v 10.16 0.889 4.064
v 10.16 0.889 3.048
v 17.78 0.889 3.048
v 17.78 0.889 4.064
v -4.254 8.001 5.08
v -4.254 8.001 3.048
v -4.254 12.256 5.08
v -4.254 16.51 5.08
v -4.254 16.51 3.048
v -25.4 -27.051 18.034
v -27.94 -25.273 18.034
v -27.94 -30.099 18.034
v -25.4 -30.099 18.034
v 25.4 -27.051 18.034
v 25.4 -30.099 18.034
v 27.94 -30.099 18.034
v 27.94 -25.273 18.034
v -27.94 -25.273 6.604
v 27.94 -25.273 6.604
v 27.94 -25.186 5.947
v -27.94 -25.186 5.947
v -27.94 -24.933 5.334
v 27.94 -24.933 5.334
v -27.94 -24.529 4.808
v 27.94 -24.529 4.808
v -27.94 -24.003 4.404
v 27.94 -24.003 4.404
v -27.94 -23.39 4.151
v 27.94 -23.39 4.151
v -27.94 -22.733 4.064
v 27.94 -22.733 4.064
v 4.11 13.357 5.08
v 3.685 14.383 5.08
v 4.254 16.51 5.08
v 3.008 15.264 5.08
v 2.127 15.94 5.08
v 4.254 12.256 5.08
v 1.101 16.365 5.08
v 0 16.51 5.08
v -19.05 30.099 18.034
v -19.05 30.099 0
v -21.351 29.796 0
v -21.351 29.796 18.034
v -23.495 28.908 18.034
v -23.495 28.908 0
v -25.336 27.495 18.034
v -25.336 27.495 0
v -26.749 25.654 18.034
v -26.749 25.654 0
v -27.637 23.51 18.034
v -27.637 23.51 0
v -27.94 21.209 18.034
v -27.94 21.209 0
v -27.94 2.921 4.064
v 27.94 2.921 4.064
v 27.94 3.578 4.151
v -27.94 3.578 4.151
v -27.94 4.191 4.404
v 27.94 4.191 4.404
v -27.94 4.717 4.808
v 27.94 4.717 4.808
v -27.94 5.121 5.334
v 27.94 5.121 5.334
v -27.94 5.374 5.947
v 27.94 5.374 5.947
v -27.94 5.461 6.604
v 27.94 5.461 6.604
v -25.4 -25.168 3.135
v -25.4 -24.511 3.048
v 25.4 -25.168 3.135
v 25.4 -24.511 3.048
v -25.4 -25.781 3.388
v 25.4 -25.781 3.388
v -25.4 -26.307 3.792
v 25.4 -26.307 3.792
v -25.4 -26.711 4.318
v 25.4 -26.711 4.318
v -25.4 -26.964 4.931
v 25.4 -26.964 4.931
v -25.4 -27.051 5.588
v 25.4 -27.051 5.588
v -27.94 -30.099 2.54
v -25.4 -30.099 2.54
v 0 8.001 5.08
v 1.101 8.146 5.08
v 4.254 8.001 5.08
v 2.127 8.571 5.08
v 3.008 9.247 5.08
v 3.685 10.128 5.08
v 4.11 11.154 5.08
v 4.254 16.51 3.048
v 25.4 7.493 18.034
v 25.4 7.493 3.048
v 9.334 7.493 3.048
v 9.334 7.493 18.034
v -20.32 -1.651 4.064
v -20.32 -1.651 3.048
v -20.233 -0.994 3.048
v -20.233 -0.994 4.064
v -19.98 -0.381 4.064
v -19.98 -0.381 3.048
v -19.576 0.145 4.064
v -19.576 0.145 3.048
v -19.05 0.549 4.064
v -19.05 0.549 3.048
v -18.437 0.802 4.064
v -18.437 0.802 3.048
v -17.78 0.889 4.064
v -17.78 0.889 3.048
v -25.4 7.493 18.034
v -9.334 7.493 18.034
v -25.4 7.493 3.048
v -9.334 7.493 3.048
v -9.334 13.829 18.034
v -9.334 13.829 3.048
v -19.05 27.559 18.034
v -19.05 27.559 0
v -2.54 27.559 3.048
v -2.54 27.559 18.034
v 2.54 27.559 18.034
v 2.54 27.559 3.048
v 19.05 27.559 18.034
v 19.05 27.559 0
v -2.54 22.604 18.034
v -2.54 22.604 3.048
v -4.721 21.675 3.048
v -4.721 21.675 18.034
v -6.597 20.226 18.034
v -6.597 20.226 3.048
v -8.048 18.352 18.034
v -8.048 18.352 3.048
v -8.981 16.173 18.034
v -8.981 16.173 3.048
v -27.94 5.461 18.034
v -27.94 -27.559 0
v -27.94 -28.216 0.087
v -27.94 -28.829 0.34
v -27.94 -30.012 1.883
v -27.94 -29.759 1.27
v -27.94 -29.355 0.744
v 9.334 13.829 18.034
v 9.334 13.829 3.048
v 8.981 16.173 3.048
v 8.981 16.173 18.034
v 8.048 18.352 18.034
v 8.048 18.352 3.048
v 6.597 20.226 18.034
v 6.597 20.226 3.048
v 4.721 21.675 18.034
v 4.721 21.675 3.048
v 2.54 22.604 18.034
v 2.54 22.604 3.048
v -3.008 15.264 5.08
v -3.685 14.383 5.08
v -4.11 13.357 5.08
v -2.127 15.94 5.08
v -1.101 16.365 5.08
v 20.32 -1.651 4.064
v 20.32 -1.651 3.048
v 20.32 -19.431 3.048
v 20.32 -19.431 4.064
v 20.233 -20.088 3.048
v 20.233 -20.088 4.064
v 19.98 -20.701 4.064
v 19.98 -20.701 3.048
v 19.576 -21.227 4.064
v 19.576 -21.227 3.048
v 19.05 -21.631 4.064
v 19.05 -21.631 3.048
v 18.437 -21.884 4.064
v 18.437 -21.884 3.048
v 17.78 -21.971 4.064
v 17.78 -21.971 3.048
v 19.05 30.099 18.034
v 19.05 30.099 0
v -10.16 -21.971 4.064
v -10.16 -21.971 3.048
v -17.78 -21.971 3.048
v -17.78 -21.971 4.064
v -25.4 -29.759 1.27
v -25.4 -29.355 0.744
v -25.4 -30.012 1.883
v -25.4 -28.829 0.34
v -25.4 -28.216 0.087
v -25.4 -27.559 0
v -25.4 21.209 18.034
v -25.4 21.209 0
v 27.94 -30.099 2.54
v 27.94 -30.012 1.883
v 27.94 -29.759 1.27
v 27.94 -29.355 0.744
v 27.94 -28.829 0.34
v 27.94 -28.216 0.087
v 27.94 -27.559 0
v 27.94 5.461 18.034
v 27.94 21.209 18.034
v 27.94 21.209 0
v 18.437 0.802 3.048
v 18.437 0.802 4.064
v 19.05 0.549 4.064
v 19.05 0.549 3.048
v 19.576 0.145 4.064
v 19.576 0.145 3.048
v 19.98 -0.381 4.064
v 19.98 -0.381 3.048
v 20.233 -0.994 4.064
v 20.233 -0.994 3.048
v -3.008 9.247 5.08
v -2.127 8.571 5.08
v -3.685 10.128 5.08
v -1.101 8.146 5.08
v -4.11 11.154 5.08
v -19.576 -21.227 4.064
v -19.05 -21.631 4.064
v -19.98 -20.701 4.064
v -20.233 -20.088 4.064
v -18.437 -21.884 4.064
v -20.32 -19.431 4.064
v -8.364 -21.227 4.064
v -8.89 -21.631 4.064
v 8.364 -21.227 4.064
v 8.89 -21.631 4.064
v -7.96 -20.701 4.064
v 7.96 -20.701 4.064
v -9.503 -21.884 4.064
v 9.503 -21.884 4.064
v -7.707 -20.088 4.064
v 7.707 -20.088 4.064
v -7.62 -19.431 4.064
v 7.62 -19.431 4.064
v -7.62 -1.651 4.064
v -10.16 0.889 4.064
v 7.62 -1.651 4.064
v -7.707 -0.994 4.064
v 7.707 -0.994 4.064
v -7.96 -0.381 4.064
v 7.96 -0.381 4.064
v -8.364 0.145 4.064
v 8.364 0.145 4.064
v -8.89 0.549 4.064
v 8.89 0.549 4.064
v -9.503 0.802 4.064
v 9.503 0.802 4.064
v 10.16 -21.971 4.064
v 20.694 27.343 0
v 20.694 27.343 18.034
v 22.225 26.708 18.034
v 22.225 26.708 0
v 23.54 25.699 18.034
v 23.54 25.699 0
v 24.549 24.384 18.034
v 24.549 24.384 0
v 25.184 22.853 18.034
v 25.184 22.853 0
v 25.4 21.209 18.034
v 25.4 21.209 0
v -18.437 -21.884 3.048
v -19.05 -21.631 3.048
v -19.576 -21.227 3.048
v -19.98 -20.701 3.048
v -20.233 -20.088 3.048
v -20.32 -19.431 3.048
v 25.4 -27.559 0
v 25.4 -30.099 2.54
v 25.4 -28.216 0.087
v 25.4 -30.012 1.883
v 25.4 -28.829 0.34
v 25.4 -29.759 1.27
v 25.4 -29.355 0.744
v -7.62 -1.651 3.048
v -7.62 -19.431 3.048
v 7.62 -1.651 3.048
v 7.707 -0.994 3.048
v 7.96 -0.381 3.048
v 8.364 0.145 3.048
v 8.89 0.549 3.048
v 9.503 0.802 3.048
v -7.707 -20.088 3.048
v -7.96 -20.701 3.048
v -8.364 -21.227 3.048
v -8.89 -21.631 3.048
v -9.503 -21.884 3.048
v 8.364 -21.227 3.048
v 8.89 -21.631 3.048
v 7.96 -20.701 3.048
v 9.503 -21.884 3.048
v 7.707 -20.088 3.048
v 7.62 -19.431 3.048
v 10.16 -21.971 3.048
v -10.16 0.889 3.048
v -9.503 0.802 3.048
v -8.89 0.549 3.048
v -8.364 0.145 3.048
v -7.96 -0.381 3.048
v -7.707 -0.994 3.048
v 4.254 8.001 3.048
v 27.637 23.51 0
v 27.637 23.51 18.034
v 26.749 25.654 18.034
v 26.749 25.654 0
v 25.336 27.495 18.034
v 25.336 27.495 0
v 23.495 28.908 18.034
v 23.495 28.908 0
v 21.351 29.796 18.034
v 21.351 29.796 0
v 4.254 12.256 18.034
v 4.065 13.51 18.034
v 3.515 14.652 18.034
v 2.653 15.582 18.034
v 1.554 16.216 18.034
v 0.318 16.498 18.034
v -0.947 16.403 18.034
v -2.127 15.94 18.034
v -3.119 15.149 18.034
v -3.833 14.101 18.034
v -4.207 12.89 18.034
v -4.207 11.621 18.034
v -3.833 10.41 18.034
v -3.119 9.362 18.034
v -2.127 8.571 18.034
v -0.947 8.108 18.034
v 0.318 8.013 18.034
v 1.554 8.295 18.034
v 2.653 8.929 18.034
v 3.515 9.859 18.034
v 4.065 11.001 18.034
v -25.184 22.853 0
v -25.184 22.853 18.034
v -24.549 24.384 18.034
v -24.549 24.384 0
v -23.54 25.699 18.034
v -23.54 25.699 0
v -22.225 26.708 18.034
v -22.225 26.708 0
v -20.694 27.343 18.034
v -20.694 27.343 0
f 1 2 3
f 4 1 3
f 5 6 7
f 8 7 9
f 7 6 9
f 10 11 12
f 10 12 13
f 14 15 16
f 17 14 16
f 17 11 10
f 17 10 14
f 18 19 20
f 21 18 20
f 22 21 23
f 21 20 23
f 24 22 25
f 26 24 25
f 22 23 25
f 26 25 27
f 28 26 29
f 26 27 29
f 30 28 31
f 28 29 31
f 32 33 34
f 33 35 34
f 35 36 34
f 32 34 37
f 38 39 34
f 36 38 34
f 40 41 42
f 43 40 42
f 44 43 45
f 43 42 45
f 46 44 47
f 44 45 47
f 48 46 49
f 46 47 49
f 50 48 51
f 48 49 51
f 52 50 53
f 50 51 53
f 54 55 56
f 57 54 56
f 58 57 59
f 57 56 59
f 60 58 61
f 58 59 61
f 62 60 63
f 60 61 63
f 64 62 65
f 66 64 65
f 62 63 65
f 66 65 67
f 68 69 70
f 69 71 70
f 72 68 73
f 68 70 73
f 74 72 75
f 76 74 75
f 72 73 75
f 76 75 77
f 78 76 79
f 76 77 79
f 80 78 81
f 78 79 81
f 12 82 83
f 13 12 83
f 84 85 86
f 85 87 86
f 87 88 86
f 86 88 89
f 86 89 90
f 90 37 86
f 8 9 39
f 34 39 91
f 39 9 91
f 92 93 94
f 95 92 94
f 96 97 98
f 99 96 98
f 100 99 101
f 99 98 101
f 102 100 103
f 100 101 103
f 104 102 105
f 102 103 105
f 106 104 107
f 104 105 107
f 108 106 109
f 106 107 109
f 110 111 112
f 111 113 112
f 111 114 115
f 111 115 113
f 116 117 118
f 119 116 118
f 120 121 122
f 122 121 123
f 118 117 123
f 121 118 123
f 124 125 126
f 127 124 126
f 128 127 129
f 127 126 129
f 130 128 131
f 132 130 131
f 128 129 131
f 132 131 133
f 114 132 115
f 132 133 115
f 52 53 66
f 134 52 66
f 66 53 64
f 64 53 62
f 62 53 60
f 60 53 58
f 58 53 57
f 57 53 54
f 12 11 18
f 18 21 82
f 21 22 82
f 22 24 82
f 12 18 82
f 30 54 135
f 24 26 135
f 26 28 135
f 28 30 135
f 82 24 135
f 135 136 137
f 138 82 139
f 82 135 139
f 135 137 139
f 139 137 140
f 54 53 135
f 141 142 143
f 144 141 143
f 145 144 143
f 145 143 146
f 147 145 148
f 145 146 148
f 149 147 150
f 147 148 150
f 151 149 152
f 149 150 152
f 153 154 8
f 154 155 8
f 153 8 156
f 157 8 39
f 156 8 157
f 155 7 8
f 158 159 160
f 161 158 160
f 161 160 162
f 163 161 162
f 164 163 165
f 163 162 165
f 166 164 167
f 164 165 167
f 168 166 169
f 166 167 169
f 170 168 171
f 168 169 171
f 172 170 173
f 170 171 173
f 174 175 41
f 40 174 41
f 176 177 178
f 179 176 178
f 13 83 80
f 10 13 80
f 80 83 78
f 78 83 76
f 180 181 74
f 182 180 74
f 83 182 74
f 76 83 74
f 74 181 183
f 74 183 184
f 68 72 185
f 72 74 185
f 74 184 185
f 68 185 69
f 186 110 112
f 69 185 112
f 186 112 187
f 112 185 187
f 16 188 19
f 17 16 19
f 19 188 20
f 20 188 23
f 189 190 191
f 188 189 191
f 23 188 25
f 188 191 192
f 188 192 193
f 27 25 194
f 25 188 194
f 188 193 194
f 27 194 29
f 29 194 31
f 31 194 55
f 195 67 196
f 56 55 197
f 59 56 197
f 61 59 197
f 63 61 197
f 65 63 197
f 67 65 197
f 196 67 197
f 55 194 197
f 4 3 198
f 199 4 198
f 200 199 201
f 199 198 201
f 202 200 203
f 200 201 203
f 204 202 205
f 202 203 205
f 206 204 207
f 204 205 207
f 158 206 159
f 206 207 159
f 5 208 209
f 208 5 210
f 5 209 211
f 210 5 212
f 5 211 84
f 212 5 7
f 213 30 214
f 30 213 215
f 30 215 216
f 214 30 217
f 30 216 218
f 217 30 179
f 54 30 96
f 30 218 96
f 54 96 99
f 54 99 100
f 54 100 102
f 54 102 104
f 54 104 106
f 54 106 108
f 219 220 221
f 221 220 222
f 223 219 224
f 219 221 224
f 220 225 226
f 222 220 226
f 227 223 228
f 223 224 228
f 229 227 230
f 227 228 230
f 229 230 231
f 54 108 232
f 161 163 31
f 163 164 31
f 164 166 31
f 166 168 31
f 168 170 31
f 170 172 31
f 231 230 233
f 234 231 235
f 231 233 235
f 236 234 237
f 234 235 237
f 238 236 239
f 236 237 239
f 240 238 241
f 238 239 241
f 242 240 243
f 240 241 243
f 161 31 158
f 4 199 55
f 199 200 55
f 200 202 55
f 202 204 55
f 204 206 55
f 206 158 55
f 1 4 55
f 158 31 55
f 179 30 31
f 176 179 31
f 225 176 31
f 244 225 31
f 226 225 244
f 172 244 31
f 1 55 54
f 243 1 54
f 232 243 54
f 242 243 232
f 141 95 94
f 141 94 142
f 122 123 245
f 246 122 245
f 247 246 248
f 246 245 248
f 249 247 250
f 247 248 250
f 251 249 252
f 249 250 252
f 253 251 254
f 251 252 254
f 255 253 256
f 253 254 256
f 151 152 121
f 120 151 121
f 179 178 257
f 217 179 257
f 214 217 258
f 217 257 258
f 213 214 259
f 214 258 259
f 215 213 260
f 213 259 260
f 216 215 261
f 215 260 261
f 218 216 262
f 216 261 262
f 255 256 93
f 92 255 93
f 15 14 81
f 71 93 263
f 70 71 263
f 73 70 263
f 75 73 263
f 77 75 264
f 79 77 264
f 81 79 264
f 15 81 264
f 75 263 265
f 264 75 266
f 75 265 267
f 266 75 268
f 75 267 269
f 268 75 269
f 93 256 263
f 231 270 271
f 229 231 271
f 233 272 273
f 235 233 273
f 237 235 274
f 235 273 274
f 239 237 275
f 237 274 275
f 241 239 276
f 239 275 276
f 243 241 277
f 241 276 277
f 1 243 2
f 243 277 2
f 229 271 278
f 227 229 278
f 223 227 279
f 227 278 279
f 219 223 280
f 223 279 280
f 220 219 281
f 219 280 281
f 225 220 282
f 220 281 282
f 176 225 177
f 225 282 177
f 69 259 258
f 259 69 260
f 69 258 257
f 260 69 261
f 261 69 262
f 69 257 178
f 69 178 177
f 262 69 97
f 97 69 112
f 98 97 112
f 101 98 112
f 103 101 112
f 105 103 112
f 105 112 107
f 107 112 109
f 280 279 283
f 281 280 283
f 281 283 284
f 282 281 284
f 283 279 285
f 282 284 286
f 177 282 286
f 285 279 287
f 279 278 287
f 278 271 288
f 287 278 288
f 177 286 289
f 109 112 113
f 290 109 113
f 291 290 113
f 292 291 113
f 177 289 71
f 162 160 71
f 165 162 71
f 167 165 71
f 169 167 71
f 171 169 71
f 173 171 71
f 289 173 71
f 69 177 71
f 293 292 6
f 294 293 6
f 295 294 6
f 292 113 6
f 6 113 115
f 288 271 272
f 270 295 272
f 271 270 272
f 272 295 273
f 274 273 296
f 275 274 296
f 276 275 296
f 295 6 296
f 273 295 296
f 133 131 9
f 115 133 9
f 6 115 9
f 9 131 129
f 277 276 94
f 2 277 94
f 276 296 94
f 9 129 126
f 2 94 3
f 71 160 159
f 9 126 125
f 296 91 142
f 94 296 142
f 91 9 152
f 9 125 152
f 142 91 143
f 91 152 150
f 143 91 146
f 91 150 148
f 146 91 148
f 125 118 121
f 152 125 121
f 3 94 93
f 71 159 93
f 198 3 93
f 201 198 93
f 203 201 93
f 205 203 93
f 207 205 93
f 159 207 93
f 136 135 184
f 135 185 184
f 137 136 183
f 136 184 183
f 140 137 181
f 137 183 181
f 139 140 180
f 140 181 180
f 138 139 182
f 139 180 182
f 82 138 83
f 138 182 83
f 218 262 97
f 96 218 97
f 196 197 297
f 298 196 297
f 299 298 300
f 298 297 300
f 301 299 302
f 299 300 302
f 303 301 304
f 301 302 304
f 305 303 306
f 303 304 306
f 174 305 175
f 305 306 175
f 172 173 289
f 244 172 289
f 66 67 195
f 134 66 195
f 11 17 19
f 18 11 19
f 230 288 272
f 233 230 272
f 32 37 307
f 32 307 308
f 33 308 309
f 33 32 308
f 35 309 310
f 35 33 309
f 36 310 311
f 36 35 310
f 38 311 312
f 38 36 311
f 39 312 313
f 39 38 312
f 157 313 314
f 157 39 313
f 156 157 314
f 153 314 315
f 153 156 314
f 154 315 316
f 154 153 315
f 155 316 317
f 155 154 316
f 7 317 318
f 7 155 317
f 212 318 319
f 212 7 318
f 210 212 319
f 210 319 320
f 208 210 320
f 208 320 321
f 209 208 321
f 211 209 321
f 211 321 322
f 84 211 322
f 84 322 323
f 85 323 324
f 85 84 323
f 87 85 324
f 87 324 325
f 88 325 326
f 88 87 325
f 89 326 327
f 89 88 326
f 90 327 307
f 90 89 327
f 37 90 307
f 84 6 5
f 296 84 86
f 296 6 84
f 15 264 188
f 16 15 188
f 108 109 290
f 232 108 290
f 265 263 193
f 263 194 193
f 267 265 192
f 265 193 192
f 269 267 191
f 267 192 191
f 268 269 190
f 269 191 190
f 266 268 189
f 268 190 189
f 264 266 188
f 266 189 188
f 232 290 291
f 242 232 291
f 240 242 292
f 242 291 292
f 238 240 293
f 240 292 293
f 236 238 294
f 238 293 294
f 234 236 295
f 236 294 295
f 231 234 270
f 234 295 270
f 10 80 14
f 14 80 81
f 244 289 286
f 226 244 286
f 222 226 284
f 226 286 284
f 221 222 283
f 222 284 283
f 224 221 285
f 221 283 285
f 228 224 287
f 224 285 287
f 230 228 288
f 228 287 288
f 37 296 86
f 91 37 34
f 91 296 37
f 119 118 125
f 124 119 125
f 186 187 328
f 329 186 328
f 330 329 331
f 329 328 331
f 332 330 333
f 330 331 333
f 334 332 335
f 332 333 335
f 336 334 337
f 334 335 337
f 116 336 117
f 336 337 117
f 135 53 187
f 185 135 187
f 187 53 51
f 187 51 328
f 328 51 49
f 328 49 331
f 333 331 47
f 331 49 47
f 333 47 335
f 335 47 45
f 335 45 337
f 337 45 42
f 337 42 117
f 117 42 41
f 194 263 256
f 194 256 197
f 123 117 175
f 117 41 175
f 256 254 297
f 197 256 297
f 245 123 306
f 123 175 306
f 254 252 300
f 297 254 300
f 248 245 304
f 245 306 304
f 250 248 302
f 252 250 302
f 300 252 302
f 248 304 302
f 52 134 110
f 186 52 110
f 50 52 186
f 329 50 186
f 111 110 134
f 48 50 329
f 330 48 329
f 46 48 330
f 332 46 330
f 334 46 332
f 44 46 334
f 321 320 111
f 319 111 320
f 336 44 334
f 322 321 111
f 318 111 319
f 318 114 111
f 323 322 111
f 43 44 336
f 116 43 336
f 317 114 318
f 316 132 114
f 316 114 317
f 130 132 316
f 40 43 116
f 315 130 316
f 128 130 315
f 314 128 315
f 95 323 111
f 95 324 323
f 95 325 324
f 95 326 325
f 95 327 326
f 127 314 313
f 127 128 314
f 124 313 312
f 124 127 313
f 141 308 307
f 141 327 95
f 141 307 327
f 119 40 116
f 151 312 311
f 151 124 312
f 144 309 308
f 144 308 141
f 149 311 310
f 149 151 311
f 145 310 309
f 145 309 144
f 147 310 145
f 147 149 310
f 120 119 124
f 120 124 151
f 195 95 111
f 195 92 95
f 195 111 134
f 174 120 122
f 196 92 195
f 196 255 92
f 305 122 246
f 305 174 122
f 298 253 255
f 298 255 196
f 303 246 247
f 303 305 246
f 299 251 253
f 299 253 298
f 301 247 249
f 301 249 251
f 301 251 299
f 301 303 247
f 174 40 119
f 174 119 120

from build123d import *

# Parameters (mm, degrees)
F1_DEPTH = 18.034
F3_W     = 8.509
F3_H     = 8.509
F4_DEPTH = 2.032
F5_R     = 4.2545
F6_DEPTH = 12.954
F8_DEPTH = 55.881
F9_R     = 2.54


with BuildPart() as f1:
    # F0 (on Top) → F1 (new body)
    with BuildSketch(Plane.XY):
        with BuildLine():
            Line((-27.94, 21.209), (-27.94, -30.099))
            Line((-27.94, -30.099), (-25.4, -30.099))
            Line((-25.4, -30.099), (-25.4, 21.209))
            ThreePointArc((-25.4, 21.209), (-23.540128, 25.699128), (-19.05, 27.559))
            Line((-19.05, 27.559), (19.05, 27.559))
            ThreePointArc((19.05, 27.559), (23.540128, 25.699128), (25.4, 21.209))
            Line((25.4, 21.209), (25.4, -30.099))
            Line((25.4, -30.099), (27.94, -30.099))
            Line((27.94, -30.099), (27.94, 21.209))
            ThreePointArc((27.94, 21.209), (25.336179, 27.495179), (19.05, 30.099))
            Line((19.05, 30.099), (-19.05, 30.099))
            ThreePointArc((-19.05, 30.099), (-25.336179, 27.495179), (-27.94, 21.209))
        make_face()
    extrude(amount=F1_DEPTH)

    # F3 (on offset) → F4 (join)
    with BuildSketch(Plane.XY.offset(3.048)):
        with BuildLine():
            Line((-25.4, 7.493), (-25.4, -27.051))
            Line((-25.4, -27.051), (25.4, -27.051))
            Line((25.4, -27.051), (25.4, 7.493))
            Line((25.4, 7.493), (9.3345, 7.493))
            Line((9.3345, 7.493), (9.3345, 13.828916))
            ThreePointArc((9.3345, 13.828916), (7.382472, 19.335437), (2.54, 22.60387))
            Line((2.54, 22.60387), (2.54, 27.559))
            Line((2.54, 27.559), (-2.54, 27.559))
            Line((-2.54, 27.559), (-2.54, 22.60387))
            ThreePointArc((-2.54, 22.60387), (-7.382472, 19.335437), (-9.3345, 13.828916))
            Line((-9.3345, 13.828916), (-9.3345, 7.493))
            Line((-9.3345, 7.493), (-25.4, 7.493))
        make_face()
        with BuildLine():
            ThreePointArc((-20.32, -1.651), (-19.576051, 0.145051), (-17.78, 0.889))
            Line((-17.78, 0.889), (-10.16, 0.889))
            ThreePointArc((-10.16, 0.889), (-8.363949, 0.145051), (-7.62, -1.651))
            Line((-7.62, -1.651), (-7.62, -19.431))
            ThreePointArc((-7.62, -19.431), (-8.363949, -21.227051), (-10.16, -21.971))
            Line((-10.16, -21.971), (-17.78, -21.971))
            ThreePointArc((-17.78, -21.971), (-19.576051, -21.227051), (-20.32, -19.431))
            Line((-20.32, -19.431), (-20.32, -1.651))
        make_face(mode=Mode.SUBTRACT)
        with BuildLine():
            ThreePointArc((7.62, -1.651), (8.363949, 0.145051), (10.16, 0.889))
            Line((10.16, 0.889), (17.78, 0.889))
            ThreePointArc((17.78, 0.889), (19.576051, 0.145051), (20.32, -1.651))
            Line((20.32, -1.651), (20.32, -19.431))
            ThreePointArc((20.32, -19.431), (19.576051, -21.227051), (17.78, -21.971))
            Line((17.78, -21.971), (10.16, -21.971))
            ThreePointArc((10.16, -21.971), (8.363949, -21.227051), (7.62, -19.431))
            Line((7.62, -19.431), (7.62, -1.651))
        make_face(mode=Mode.SUBTRACT)
        with Locations((0, 12.2555)):
            Rectangle(F3_W, F3_H, mode=Mode.SUBTRACT)
    extrude(amount=F4_DEPTH)

    # F5 (on face) → F6 (join, through all)
    with BuildSketch(Plane.XY.offset(5.08)):
        with BuildLine():
            Line((-9.3345, 13.828916), (-9.3345, 7.493))
            Line((-9.3345, 7.493), (-25.4, 7.493))
            Line((-25.4, 7.493), (-25.4, -27.051))
            Line((-25.4, -27.051), (25.4, -27.051))
            Line((25.4, -27.051), (25.4, 7.493))
            Line((25.4, 7.493), (9.3345, 7.493))
            Line((9.3345, 7.493), (9.3345, 13.828916))
            ThreePointArc((9.3345, 13.828916), (7.382472, 19.335437), (2.54, 22.60387))
            Line((2.54, 22.60387), (2.54, 27.559))
            Line((2.54, 27.559), (-2.54, 27.559))
            Line((-2.54, 27.559), (-2.54, 22.60387))
            ThreePointArc((-2.54, 22.60387), (-7.382472, 19.335437), (-9.3345, 13.828916))
        make_face()
        with Locations((0, 12.2555)):
            Circle(F5_R, mode=Mode.SUBTRACT)
    extrude(amount=F6_DEPTH)

    # F7 (on face) → F8 (cut, through all)
    with BuildSketch(Plane.YZ.offset(27.94)):
        with BuildLine():
            Line((5.461, 18.034), (-25.273, 18.034))
            Line((-25.273, 18.034), (-25.273, 6.604))
            ThreePointArc((-25.273, 6.604), (-24.529051, 4.807949), (-22.733, 4.064))
            Line((-22.733, 4.064), (2.921, 4.064))
            ThreePointArc((2.921, 4.064), (4.717051, 4.807949), (5.461, 6.604))
            Line((5.461, 6.604), (5.461, 18.034))
        make_face()
    extrude(amount=-F8_DEPTH, mode=Mode.SUBTRACT)

    # F9
    f9_edges = [f1.edges().sort_by_distance(p)[0] for p in [
        (-26.67, -30.099, 0),
        (26.67, -30.099, 0),
        (0, -27.051, 3.048),
    ]]
    fillet(f9_edges, radius=F9_R)


solid = f1.part
